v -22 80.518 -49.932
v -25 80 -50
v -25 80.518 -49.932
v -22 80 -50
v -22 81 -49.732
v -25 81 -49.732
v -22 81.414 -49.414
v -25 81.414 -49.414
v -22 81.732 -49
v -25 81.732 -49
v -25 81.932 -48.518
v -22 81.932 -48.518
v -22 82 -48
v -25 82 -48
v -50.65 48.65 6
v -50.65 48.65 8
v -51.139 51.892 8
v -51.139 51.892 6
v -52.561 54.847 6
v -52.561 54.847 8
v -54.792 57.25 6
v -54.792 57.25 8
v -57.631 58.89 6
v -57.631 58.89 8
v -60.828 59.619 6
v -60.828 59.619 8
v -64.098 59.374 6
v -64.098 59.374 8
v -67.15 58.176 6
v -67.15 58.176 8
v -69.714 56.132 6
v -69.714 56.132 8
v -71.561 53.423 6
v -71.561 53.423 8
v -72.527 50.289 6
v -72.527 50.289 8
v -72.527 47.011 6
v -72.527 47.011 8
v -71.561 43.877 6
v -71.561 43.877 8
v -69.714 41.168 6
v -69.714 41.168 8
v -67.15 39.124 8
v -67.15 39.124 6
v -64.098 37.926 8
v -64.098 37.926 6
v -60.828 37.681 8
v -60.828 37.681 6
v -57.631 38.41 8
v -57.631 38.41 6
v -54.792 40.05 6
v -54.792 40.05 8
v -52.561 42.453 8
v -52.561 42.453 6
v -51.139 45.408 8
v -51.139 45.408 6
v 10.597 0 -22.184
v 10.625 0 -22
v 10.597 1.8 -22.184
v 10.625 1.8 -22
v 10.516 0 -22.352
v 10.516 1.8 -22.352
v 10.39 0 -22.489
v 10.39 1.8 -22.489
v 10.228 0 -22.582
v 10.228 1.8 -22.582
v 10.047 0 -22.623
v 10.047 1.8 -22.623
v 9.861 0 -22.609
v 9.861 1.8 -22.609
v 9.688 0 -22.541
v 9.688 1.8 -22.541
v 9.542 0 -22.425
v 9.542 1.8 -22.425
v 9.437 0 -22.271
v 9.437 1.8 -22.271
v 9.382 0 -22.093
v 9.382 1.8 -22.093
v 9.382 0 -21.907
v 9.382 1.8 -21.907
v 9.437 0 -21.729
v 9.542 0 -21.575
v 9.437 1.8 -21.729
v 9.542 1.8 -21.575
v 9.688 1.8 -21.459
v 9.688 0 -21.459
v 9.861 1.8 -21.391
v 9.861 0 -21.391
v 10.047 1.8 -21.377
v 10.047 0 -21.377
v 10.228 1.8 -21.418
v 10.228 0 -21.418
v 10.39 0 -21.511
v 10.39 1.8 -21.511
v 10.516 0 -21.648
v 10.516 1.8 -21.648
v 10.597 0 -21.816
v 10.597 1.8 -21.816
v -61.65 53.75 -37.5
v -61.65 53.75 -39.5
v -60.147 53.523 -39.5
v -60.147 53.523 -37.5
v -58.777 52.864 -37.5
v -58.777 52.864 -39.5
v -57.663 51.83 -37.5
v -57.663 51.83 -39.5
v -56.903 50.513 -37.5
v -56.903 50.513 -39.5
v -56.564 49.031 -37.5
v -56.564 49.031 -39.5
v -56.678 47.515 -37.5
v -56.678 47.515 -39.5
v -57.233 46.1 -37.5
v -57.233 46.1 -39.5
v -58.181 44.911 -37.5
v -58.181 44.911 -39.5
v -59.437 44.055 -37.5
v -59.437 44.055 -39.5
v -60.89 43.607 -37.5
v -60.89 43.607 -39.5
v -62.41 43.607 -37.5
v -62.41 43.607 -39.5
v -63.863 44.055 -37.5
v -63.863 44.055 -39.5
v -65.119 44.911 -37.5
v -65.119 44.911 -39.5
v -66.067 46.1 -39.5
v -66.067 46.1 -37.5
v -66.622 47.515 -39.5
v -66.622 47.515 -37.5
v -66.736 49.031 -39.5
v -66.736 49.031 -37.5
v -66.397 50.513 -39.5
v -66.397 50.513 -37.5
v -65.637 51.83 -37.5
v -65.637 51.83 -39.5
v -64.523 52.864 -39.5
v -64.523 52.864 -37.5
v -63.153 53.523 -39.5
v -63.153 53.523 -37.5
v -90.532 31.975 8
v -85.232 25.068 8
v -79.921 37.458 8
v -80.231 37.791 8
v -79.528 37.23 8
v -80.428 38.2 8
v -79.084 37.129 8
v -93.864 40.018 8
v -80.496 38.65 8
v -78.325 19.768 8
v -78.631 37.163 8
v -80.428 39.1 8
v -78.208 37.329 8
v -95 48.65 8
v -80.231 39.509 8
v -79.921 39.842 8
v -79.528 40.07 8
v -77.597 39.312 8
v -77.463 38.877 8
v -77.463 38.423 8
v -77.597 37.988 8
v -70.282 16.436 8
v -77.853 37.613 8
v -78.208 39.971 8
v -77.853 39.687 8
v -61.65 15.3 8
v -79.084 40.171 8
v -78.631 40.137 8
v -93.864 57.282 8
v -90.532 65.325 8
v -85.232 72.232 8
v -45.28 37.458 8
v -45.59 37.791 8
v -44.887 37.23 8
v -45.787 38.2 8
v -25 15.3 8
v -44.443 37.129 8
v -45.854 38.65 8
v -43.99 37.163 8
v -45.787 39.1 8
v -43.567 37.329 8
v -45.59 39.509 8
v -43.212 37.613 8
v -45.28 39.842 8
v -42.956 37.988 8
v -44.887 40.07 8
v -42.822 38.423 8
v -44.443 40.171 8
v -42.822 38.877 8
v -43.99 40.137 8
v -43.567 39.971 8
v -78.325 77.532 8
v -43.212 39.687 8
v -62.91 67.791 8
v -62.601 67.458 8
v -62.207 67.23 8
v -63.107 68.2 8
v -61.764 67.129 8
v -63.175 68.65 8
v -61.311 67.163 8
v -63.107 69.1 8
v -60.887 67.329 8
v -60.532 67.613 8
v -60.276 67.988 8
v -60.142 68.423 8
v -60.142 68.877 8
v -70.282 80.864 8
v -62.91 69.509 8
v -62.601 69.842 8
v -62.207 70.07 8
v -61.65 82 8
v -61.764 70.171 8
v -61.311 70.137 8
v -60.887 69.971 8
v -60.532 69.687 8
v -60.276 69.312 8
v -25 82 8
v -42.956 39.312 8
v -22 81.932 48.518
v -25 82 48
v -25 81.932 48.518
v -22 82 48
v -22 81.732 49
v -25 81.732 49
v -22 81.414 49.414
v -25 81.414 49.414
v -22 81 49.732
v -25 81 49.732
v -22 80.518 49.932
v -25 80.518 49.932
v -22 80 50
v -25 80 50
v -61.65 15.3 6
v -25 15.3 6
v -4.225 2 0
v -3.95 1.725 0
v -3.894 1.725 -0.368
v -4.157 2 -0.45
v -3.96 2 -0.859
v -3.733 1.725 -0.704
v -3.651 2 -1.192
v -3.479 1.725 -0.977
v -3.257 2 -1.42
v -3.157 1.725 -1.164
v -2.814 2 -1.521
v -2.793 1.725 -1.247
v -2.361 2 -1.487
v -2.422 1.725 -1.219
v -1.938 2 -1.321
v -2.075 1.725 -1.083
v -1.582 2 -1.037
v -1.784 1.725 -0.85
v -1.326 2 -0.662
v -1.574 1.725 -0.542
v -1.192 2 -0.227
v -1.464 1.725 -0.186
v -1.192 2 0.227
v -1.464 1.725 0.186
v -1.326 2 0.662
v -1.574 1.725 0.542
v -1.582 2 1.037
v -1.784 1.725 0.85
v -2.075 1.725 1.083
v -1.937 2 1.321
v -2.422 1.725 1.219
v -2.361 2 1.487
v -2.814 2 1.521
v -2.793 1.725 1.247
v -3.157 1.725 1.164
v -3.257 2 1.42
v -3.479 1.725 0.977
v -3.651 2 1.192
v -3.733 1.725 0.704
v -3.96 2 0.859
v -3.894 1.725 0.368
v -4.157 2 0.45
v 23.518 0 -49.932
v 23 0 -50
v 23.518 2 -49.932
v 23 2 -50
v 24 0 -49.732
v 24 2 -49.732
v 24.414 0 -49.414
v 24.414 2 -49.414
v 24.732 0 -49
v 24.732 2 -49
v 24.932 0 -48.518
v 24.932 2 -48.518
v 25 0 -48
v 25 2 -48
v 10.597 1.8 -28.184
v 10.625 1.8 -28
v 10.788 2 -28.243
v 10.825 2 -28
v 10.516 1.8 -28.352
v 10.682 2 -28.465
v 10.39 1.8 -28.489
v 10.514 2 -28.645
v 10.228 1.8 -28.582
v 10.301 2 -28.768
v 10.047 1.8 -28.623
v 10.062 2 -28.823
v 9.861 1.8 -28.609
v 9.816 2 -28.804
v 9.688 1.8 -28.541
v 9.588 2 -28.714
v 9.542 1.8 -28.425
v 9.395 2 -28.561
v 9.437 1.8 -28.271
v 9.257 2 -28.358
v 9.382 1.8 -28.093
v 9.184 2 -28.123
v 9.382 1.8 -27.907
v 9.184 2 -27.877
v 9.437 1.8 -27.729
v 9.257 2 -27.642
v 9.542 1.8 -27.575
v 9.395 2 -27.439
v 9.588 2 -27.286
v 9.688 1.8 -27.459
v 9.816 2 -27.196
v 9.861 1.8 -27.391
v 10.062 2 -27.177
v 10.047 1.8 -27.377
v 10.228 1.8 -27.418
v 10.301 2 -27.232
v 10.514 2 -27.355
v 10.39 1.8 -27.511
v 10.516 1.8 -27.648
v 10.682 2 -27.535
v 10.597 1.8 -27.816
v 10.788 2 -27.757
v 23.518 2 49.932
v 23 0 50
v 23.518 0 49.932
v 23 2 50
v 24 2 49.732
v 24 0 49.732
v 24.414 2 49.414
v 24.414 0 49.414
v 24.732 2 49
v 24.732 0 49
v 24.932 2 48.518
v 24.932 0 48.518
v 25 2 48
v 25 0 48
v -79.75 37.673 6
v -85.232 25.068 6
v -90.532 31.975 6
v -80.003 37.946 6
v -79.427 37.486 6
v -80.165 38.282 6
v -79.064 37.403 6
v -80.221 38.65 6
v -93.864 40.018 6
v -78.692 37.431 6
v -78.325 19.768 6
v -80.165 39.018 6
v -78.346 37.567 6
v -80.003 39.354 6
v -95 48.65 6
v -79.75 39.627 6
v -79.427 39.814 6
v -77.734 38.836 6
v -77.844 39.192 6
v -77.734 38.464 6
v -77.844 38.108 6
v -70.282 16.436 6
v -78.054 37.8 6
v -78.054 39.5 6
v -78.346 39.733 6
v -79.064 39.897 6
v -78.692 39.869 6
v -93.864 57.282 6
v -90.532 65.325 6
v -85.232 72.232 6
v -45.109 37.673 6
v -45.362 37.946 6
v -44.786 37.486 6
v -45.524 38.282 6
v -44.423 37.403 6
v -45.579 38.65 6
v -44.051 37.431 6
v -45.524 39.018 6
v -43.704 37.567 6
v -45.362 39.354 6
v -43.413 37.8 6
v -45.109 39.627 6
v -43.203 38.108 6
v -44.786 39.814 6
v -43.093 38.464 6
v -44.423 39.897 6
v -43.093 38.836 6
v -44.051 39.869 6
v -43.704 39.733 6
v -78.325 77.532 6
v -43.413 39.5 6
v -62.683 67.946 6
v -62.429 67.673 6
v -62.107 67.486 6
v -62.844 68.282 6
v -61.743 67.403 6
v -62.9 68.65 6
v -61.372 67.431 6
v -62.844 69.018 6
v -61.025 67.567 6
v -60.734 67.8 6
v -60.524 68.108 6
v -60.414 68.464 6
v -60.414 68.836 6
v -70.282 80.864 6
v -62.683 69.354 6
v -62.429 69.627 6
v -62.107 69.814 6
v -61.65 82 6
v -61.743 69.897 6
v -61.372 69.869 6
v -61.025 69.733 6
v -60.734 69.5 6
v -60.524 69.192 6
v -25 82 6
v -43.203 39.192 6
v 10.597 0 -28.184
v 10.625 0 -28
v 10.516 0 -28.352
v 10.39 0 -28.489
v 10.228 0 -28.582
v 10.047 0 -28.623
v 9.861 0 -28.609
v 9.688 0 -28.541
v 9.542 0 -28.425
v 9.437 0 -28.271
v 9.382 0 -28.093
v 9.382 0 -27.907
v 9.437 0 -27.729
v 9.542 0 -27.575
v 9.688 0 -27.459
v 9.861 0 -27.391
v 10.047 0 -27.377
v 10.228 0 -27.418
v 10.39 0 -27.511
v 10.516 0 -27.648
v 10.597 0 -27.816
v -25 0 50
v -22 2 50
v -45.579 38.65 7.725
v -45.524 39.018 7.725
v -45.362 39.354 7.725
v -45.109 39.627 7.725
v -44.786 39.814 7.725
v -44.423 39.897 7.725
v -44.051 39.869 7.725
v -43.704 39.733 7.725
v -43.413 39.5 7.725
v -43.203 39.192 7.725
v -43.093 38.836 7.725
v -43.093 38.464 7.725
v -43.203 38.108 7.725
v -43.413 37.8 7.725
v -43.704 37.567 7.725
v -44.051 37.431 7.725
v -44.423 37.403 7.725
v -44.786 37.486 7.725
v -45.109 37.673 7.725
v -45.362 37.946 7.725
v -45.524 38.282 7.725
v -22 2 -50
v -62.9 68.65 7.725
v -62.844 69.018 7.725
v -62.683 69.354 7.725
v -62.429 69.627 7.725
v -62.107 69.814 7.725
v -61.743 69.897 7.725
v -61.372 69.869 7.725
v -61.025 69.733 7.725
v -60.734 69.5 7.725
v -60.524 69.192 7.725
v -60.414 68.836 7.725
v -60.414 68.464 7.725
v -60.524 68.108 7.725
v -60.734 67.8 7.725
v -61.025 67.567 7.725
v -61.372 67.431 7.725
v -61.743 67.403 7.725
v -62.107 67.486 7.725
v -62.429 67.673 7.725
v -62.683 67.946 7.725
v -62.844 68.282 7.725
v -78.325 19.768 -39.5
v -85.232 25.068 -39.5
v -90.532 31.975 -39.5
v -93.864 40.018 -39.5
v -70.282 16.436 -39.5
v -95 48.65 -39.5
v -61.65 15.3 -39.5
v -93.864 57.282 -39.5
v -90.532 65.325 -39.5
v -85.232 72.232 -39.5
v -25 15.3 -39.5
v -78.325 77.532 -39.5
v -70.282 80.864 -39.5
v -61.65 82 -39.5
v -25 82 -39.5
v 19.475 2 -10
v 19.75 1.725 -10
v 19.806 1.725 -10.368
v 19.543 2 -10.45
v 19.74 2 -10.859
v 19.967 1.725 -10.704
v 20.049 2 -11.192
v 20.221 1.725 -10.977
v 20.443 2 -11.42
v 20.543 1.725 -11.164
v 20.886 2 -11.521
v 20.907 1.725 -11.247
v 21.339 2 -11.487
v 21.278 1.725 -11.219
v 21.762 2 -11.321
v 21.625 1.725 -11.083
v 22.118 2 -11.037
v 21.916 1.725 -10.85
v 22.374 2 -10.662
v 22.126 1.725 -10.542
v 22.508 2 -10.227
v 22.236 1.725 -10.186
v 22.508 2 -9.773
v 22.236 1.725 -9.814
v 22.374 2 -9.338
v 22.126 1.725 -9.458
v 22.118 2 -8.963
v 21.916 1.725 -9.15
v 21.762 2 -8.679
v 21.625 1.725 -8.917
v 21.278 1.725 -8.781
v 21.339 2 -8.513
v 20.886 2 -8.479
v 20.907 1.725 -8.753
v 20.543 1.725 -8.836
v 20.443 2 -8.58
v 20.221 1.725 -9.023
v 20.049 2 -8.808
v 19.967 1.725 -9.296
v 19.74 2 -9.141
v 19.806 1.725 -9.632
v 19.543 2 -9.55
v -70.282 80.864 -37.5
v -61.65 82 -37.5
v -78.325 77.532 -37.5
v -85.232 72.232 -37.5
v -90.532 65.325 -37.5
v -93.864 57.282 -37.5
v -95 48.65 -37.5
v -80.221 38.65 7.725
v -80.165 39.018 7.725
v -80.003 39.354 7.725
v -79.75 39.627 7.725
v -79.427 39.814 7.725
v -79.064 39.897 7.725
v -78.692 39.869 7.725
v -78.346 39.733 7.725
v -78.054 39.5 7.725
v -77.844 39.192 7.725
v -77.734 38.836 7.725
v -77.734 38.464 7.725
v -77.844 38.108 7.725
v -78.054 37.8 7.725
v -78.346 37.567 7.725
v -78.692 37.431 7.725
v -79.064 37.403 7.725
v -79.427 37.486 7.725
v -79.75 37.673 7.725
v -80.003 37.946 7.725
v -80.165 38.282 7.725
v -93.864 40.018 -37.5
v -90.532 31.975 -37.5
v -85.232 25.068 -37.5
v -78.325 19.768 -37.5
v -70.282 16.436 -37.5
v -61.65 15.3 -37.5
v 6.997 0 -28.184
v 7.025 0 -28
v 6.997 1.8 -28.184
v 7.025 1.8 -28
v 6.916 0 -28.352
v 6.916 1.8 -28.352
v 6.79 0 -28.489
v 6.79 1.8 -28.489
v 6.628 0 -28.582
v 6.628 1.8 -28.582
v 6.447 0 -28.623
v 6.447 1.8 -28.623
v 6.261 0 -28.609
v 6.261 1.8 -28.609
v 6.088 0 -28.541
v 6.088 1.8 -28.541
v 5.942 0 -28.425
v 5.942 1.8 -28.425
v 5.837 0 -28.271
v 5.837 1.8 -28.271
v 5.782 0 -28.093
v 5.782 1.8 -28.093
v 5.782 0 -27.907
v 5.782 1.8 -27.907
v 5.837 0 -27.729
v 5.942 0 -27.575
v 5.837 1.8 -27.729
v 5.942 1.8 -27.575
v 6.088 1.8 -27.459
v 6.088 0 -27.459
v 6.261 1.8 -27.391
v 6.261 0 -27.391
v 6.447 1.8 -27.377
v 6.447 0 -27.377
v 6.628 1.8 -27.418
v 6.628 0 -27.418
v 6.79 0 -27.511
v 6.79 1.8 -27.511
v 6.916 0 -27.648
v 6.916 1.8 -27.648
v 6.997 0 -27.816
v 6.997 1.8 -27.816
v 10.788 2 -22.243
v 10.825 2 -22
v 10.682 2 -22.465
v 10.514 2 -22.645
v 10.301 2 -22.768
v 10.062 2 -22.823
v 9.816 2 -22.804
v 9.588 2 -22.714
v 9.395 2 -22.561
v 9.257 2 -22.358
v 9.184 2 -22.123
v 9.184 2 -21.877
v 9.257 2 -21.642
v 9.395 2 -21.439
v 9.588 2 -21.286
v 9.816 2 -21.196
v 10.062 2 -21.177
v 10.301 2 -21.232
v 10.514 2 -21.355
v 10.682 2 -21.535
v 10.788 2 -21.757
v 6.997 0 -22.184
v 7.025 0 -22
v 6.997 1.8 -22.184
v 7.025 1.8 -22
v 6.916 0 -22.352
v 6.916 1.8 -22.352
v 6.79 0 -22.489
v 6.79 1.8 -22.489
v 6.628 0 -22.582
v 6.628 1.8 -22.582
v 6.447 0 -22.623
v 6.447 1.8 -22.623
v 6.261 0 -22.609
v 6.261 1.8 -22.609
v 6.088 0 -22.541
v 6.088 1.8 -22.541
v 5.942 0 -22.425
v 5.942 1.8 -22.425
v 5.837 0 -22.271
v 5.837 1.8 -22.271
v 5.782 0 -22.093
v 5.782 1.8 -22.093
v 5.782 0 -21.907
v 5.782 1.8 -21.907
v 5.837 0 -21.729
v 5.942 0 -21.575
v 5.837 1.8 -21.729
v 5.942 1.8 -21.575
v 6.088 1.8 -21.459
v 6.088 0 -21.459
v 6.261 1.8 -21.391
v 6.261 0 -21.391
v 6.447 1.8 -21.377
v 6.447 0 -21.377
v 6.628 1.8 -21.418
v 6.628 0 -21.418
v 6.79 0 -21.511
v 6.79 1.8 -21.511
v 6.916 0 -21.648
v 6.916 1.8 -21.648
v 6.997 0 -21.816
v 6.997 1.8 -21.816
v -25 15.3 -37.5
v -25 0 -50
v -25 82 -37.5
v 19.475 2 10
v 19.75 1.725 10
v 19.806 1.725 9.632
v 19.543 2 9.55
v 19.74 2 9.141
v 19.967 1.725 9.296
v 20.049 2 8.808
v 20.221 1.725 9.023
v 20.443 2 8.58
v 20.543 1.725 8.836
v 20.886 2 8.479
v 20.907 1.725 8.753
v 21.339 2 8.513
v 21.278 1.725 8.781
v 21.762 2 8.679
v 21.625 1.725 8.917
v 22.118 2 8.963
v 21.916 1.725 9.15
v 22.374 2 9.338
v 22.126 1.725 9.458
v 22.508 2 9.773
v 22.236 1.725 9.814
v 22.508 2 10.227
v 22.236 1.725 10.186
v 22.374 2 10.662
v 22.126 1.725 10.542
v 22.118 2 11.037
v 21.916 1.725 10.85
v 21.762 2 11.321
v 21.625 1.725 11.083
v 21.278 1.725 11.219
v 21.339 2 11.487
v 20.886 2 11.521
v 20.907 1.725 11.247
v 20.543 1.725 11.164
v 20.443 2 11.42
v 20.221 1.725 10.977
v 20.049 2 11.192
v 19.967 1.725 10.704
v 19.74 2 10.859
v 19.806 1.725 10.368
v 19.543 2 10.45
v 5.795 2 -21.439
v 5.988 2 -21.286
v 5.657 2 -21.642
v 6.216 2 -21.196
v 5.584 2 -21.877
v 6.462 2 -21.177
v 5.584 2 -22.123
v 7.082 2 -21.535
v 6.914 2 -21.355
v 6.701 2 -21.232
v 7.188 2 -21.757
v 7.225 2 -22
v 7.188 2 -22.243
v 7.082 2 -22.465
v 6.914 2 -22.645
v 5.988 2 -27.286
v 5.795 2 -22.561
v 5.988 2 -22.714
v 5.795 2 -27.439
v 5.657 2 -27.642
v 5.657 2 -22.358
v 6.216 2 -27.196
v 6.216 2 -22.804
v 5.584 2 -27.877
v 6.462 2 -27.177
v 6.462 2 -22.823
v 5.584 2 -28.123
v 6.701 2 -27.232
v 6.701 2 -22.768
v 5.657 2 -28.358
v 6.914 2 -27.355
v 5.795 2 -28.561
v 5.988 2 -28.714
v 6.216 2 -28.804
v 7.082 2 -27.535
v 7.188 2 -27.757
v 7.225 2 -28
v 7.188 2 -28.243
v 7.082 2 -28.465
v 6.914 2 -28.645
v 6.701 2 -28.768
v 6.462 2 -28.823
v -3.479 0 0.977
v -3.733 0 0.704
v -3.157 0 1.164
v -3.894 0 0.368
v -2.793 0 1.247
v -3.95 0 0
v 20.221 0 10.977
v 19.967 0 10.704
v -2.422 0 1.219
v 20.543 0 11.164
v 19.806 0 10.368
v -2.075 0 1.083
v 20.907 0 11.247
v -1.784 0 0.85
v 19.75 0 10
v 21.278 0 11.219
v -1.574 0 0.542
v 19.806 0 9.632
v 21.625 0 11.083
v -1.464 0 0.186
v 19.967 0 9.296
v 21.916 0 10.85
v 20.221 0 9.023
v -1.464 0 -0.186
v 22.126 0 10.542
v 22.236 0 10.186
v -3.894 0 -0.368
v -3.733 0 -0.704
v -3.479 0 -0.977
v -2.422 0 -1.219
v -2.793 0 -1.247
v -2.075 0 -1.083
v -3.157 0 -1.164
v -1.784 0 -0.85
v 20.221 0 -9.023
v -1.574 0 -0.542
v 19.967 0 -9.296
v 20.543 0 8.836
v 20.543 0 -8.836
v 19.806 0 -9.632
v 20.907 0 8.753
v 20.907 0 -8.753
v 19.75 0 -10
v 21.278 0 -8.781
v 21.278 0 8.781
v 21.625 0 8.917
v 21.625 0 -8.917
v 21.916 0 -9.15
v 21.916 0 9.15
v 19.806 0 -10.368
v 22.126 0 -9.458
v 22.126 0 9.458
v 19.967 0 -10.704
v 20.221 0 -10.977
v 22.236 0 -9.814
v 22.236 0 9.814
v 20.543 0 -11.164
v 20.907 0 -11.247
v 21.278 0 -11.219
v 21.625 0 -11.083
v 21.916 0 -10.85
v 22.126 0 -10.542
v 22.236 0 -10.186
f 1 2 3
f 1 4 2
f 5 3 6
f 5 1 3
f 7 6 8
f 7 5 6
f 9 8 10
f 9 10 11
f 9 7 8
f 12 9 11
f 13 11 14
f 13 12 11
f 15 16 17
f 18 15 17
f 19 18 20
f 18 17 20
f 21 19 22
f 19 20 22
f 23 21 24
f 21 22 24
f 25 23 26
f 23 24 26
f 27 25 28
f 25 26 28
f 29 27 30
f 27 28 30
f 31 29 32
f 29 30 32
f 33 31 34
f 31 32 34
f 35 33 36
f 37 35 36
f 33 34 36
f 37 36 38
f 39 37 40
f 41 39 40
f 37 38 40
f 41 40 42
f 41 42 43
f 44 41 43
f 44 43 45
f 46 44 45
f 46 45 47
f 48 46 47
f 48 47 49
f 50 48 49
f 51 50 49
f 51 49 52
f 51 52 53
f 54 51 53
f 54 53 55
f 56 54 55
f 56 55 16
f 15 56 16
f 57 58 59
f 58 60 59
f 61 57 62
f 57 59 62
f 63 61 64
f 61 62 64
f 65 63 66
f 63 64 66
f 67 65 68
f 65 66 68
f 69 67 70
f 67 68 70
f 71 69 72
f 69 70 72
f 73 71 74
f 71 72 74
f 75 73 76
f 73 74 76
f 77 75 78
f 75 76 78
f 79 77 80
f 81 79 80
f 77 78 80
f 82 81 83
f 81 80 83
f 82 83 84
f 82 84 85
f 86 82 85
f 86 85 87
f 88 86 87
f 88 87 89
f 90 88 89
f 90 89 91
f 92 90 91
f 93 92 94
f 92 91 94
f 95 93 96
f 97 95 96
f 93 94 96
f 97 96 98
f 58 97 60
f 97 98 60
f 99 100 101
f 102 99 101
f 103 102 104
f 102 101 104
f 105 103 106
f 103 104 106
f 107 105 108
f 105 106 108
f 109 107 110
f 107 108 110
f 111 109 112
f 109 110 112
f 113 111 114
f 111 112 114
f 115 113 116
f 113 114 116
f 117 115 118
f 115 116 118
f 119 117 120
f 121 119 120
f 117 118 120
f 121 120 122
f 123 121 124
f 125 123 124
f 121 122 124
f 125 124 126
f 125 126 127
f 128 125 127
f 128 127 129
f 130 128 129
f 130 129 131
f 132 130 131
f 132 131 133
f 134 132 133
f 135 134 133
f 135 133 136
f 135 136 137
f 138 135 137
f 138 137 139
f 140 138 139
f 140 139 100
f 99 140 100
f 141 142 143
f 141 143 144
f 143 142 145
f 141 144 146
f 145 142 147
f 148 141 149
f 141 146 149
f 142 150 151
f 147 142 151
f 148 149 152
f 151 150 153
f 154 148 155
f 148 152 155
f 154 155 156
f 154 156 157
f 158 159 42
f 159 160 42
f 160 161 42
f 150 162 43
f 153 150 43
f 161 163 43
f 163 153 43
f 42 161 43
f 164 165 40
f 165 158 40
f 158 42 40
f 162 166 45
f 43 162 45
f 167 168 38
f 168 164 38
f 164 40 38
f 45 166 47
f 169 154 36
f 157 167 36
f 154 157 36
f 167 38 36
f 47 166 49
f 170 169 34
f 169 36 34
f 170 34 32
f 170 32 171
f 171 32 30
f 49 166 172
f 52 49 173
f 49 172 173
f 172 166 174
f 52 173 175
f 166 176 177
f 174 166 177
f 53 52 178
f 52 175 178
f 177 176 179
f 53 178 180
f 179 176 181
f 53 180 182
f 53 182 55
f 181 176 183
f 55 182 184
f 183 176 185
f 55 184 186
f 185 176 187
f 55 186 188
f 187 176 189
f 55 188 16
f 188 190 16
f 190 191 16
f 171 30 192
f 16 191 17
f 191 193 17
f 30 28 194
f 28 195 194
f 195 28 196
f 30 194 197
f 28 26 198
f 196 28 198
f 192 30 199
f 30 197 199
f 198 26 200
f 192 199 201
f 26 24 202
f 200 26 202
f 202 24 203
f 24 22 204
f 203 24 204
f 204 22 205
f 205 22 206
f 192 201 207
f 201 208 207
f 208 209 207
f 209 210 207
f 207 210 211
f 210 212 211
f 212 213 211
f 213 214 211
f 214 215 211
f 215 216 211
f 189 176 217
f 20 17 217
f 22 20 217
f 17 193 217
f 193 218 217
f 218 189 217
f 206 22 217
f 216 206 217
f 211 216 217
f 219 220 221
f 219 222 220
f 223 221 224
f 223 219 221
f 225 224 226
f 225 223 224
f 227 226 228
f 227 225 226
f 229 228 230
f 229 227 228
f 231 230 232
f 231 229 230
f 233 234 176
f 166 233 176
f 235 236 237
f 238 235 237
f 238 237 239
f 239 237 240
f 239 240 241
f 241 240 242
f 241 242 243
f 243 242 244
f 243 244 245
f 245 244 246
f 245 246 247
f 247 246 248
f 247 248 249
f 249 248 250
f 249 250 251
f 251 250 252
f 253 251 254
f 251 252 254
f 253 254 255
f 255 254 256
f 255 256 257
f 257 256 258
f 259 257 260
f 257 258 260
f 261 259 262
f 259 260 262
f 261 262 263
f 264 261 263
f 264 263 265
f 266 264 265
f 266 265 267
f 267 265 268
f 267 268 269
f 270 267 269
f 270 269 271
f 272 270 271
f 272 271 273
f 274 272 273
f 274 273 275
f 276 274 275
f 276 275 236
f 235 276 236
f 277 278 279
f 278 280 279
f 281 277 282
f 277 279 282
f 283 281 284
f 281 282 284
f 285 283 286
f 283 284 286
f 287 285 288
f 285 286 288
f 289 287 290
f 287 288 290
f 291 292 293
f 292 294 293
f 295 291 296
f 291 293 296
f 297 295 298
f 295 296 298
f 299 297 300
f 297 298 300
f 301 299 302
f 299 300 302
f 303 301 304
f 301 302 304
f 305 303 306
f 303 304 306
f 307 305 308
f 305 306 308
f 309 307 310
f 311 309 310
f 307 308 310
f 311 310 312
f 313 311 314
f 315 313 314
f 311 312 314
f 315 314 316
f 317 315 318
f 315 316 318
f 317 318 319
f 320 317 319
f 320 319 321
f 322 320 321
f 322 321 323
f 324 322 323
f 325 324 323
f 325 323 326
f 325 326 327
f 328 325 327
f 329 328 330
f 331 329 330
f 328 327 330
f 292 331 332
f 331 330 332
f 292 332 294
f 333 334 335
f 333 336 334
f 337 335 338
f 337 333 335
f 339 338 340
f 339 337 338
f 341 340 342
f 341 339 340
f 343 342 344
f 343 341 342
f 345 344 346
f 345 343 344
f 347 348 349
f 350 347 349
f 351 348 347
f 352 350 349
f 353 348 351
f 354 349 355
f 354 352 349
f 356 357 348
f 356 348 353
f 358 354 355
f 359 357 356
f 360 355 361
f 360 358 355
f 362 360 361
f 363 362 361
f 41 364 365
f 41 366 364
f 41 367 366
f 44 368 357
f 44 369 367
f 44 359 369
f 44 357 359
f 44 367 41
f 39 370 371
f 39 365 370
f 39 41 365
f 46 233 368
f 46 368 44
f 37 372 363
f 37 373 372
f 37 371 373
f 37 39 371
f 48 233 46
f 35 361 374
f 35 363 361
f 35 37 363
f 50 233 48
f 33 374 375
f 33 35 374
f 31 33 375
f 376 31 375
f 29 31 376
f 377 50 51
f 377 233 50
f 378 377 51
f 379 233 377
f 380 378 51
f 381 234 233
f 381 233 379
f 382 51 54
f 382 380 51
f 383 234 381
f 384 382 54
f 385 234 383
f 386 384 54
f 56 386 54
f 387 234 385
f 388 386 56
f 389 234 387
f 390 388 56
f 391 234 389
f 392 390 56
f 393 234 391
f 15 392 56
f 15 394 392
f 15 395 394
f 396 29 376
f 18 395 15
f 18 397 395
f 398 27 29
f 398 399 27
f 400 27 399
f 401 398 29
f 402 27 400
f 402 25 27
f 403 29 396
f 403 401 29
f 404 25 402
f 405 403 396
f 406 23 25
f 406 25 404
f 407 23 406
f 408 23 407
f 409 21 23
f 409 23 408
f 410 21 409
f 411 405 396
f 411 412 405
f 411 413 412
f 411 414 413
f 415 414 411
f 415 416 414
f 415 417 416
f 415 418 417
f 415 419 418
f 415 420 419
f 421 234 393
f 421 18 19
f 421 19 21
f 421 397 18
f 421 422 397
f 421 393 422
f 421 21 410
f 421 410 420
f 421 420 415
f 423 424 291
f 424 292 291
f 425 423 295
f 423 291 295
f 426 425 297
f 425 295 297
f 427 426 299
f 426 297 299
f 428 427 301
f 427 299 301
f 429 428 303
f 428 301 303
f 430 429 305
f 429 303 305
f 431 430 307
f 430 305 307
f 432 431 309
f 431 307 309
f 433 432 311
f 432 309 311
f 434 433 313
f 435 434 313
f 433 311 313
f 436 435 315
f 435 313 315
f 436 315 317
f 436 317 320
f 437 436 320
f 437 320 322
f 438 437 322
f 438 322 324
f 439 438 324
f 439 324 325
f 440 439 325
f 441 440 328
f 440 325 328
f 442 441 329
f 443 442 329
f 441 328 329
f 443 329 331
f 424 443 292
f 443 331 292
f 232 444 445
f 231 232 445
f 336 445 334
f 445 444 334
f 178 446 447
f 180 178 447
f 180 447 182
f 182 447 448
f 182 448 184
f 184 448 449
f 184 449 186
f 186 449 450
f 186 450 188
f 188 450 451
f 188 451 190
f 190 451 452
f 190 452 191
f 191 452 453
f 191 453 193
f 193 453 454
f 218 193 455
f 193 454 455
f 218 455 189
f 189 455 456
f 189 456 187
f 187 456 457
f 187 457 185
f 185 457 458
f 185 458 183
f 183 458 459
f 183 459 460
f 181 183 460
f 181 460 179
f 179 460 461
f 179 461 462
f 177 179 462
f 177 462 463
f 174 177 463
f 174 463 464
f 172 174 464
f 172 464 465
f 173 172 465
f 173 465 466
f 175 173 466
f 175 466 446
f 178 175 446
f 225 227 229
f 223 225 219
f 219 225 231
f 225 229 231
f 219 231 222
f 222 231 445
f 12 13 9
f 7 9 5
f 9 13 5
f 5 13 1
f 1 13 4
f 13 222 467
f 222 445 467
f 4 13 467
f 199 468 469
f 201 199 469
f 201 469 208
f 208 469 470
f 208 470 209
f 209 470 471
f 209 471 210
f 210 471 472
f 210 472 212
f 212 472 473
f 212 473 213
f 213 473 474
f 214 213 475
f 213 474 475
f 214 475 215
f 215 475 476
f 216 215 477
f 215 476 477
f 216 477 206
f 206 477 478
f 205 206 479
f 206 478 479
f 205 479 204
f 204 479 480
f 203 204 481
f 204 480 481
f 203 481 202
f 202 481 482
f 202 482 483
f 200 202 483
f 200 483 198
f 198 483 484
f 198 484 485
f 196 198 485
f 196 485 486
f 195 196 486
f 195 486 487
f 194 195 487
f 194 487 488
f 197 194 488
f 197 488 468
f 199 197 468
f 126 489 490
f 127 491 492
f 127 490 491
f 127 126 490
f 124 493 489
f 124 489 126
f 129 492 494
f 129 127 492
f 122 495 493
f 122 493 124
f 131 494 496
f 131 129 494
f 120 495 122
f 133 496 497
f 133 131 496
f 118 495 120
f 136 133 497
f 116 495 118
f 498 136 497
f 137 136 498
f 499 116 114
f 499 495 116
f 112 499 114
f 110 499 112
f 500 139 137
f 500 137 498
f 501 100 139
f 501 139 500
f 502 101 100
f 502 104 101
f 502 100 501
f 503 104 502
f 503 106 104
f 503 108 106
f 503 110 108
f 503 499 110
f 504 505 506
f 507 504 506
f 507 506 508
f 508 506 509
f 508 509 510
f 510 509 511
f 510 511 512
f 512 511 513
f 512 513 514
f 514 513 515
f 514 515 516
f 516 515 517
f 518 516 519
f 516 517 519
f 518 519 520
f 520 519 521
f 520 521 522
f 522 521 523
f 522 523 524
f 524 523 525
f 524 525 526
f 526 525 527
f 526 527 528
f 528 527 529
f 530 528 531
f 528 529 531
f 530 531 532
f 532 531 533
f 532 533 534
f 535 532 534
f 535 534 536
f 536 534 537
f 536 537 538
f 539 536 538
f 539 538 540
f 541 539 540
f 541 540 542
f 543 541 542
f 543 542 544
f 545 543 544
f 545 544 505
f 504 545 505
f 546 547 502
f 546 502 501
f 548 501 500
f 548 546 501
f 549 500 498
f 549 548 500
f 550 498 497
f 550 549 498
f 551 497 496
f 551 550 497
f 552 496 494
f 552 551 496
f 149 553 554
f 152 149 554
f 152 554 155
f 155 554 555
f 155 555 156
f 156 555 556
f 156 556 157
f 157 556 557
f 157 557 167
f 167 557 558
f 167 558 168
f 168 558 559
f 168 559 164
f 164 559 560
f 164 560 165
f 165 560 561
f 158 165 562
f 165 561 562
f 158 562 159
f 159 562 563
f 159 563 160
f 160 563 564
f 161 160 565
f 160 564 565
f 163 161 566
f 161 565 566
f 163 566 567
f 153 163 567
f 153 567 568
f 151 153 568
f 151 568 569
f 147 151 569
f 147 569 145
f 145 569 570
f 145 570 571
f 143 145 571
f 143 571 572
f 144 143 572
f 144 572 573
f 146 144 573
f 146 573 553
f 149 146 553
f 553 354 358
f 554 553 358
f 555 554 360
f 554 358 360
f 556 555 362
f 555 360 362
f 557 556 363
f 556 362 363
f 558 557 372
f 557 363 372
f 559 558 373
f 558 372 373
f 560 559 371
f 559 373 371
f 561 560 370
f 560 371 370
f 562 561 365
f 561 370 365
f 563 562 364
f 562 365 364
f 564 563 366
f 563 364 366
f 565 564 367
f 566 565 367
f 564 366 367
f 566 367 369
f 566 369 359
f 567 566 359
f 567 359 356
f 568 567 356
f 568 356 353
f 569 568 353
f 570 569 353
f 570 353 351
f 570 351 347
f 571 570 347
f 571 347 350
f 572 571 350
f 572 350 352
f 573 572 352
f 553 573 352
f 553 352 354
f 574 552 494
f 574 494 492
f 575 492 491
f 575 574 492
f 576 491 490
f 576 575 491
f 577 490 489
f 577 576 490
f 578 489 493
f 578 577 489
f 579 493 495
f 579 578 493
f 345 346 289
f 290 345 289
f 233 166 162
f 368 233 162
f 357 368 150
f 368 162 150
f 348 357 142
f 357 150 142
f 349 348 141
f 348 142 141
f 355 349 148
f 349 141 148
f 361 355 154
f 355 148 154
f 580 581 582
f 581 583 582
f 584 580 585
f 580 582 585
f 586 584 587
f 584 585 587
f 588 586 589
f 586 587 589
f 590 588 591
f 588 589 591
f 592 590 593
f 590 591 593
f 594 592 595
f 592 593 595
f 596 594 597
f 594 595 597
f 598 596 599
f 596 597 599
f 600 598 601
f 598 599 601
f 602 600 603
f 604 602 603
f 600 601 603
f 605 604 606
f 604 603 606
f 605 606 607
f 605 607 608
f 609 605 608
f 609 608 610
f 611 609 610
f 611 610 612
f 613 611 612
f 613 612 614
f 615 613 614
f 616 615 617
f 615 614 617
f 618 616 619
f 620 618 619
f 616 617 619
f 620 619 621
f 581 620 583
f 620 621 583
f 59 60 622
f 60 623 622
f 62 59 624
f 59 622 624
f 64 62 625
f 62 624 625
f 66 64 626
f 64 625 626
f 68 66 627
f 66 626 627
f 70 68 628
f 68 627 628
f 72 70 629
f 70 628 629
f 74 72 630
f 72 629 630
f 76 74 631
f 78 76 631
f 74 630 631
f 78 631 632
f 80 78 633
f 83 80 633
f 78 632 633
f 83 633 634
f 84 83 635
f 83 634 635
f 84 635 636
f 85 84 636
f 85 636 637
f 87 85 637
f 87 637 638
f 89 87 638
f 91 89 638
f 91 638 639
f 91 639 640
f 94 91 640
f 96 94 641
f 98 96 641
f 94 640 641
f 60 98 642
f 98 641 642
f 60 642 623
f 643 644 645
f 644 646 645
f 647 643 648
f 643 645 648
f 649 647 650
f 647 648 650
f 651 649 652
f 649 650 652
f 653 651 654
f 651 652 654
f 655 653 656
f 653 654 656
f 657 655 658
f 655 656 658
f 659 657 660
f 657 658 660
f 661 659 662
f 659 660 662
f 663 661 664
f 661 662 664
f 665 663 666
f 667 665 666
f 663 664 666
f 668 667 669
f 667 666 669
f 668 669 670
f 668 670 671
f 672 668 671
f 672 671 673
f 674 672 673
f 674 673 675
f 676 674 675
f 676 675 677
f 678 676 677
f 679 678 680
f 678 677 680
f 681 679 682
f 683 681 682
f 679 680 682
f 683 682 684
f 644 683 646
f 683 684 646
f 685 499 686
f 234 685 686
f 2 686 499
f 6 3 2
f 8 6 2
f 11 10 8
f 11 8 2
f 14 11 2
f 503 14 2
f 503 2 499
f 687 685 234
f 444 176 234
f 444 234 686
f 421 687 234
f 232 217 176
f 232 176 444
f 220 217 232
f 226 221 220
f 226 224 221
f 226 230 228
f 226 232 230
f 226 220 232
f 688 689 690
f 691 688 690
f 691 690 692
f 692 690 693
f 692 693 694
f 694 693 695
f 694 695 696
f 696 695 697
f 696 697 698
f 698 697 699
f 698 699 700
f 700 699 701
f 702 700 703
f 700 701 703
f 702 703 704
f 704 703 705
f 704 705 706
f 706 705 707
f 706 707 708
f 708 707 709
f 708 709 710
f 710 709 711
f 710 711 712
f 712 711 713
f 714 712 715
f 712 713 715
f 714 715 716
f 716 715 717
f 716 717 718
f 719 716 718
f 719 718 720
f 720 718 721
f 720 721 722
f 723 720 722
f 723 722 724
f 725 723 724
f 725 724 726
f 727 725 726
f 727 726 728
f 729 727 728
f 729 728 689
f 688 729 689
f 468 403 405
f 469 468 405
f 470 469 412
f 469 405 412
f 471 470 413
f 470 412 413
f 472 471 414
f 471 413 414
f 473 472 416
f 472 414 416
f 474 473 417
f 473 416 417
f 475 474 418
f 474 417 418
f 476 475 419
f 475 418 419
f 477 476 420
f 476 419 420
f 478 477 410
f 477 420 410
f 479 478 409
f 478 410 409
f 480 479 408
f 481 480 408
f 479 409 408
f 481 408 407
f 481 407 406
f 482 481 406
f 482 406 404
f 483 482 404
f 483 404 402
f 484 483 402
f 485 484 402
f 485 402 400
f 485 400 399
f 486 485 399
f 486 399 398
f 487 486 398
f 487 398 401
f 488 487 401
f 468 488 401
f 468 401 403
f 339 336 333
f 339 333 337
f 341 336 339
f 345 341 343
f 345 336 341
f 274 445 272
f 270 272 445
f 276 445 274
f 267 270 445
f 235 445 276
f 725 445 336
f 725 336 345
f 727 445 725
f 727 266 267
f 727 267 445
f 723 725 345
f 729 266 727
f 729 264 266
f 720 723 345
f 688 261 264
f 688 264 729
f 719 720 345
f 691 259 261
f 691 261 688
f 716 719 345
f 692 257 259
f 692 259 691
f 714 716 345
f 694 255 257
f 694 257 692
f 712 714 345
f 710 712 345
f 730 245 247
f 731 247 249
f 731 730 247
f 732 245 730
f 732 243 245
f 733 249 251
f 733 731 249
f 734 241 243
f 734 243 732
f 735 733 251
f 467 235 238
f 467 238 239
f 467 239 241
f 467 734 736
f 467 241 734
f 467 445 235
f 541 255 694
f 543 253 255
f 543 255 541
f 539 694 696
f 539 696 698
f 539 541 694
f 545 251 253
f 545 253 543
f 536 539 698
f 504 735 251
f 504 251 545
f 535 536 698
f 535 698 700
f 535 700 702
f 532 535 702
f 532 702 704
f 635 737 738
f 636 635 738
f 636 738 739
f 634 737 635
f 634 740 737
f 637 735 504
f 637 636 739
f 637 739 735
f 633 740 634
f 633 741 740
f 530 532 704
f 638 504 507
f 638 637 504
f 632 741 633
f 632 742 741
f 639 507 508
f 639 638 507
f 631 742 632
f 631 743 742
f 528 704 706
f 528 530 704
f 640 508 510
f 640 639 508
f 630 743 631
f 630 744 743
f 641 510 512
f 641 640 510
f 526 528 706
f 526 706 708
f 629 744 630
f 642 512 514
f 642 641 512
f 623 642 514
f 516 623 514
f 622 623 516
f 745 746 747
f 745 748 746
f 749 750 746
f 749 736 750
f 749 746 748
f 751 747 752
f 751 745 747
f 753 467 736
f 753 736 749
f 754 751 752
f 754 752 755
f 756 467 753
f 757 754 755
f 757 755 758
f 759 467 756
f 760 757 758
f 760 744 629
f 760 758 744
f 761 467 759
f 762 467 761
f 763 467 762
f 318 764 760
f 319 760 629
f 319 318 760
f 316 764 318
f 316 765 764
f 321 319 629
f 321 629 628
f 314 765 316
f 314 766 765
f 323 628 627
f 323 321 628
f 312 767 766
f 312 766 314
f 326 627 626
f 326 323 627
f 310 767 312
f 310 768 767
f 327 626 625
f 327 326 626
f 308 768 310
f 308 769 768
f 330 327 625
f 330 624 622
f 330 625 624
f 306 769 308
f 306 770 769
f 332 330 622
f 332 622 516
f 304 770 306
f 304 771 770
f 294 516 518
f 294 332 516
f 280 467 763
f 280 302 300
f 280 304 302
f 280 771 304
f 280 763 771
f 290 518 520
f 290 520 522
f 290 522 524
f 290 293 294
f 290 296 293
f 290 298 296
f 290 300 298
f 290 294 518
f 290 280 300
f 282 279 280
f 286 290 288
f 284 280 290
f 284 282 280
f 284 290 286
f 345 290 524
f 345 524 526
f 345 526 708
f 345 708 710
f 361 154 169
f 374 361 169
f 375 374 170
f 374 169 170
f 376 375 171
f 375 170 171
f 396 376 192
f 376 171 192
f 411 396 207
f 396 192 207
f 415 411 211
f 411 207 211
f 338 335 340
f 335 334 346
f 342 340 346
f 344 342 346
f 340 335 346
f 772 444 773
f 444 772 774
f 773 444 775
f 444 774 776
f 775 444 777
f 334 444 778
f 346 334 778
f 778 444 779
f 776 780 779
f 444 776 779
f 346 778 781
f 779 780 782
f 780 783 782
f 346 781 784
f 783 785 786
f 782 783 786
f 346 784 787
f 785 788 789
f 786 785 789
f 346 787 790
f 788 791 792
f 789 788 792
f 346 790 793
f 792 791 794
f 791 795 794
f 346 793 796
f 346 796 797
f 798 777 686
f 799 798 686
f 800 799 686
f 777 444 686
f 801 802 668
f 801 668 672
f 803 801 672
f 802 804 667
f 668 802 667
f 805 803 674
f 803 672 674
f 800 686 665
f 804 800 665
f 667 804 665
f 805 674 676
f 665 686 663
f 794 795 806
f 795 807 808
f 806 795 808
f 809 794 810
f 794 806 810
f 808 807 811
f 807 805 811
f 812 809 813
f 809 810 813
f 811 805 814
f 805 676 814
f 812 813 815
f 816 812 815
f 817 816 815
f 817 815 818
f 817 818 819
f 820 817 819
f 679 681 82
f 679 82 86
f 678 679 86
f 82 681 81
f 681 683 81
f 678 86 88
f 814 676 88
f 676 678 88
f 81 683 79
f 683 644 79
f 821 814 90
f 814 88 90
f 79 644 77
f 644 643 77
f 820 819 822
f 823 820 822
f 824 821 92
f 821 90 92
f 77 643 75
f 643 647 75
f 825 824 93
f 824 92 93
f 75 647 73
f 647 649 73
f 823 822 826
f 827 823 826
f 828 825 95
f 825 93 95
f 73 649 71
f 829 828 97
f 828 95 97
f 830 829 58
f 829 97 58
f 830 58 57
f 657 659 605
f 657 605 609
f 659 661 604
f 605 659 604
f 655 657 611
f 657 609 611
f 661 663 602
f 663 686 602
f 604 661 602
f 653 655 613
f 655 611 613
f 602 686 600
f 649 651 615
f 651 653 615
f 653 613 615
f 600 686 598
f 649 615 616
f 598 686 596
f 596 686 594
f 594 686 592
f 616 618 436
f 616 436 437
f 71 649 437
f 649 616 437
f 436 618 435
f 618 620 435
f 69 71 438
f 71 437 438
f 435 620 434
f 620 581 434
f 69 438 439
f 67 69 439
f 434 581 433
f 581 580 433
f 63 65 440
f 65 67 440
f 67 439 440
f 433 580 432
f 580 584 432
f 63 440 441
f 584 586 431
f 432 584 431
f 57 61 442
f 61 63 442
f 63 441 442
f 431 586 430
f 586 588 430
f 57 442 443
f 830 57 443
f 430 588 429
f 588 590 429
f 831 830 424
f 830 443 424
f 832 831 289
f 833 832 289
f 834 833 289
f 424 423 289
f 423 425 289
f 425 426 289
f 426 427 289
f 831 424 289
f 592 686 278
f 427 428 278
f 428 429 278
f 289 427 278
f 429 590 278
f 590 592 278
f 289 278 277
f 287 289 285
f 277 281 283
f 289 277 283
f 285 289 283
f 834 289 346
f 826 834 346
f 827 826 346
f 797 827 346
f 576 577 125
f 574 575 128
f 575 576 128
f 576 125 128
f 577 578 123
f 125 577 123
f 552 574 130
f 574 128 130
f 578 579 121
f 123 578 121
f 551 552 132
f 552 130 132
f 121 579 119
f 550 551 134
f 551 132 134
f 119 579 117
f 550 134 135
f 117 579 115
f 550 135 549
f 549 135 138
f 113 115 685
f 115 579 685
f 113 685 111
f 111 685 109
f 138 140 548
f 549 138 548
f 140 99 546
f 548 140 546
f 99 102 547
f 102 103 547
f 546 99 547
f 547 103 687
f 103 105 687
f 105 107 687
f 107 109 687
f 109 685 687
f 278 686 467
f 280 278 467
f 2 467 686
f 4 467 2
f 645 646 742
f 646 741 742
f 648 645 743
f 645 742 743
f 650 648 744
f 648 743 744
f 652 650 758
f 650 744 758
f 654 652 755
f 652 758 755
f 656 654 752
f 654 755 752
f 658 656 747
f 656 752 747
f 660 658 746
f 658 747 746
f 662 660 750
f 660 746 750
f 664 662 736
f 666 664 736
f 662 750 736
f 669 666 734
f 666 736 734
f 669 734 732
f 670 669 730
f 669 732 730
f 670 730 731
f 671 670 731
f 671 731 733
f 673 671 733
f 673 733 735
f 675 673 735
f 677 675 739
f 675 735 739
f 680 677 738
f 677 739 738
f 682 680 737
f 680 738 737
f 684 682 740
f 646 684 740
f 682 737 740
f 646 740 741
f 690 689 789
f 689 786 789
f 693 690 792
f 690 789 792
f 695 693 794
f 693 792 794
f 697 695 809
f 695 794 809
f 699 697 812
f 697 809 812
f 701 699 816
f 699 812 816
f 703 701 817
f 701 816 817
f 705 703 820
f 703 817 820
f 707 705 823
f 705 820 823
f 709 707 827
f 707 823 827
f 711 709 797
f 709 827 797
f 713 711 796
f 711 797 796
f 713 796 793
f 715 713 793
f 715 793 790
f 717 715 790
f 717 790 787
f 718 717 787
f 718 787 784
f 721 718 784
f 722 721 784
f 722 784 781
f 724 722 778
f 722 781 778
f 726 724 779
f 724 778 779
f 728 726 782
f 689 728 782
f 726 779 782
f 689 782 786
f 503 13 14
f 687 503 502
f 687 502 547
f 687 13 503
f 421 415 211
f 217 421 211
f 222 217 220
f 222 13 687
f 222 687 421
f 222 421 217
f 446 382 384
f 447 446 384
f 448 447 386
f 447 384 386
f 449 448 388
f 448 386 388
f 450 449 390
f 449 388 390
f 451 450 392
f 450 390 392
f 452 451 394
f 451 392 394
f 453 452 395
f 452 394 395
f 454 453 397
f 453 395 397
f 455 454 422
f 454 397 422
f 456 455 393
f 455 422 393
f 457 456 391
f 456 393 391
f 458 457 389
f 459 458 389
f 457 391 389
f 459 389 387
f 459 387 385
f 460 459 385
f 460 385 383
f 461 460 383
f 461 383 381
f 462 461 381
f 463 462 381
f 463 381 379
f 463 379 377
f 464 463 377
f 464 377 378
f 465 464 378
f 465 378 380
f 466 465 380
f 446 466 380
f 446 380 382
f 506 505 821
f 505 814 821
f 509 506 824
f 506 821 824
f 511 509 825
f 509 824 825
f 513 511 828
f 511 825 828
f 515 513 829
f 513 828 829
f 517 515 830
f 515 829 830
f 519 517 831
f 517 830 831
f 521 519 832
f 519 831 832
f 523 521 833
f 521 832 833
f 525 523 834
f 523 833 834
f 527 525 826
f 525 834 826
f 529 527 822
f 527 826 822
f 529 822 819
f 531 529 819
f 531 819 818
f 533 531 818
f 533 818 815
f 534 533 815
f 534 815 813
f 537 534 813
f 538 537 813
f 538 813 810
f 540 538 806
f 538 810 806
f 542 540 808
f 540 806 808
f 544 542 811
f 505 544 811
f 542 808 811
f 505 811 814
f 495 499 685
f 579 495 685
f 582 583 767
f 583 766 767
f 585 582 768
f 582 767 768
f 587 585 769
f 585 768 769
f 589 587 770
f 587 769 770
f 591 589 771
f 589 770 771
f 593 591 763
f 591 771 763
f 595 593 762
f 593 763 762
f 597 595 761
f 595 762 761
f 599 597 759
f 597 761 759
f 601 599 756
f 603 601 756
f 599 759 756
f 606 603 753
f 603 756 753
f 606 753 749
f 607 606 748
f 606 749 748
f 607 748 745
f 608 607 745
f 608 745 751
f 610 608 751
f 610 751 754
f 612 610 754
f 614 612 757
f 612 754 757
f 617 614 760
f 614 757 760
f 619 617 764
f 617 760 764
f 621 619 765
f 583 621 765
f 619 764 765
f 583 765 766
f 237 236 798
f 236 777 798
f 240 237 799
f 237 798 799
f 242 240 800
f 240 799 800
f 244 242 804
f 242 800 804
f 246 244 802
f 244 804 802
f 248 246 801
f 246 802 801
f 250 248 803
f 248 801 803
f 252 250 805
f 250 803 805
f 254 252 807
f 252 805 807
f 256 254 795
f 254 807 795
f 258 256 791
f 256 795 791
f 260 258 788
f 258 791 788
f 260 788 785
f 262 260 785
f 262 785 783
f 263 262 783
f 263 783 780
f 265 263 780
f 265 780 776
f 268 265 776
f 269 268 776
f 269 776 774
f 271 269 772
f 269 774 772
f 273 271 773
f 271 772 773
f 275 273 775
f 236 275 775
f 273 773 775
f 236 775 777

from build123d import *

# Parameters (mm, degrees)
SKETCH_1_W                   = 50
SKETCH_1_H                   = 100
EXTRUDE_1_DEPTH              = 2
SKETCH_2_W                   = 3
SKETCH_2_H                   = 100
EXTRUDE_2_DEPTH              = 80
SKETCH_3_W                   = 2
SKETCH_3_H                   = 66.7
EXTRUDE_3_DEPTH              = 70
CUT_EXTRUDE_4_REACH          = 162.465
SKETCH_8_W                   = 2
SKETCH_8_H                   = 66.7
EXTRUDE_4_DEPTH              = 70
CUT_EXTRUDE_5_REACH          = 140.25
HOLE_WIZARD_M3_1_D           = 2.5
HOLE_WIZARD_M3_1_DEPTH       = 2
HOLE_WIZARD_M3_1_CSINK_D     = 3.05
HOLE_WIZARD_M3_1_CSINK_ANGLE = 90
FILLET_1_R                   = 2
CUT_EXTRUDE_6_REACH          = 140.25
SKETCH_12_R                  = 11
CUT_EXTRUDE_7_REACH          = 162.465
SKETCH_13_R                  = 14.5
SKETCH_14_W                  = 2
SKETCH_14_H                  = 66.7
EXTRUDE_5_DEPTH              = 70
CUT_EXTRUDE_8_REACH          = 156.14
SKETCH_15_R                  = 5.1
CUT_EXTRUDE_9_DEPTH          = 155.140358116
CUT_EXTRUDE_9_DEPTH_BACK     = 155.140358116
SKETCH_19_W                  = 2
SKETCH_19_H                  = 66.7
CUT_EXTRUDE_10_DEPTH         = 119.844436134
FILLET_2_R                   = 2
HOLE_WIZARD_M3_3_D           = 2.5
HOLE_WIZARD_M3_3_CSINK_D     = 3.05
HOLE_WIZARD_M3_3_CSINK_ANGLE = 90


# Read off the part's stored shape, not the designer's step: M1.6 螺纹孔1, M1.6 螺纹孔2
with BuildPart() as part:
    # 草图1 → 凸台-拉伸1 (new body)
    with BuildSketch(Plane(origin=(0, 0, 0), x_dir=(1, 0, 0), z_dir=(0, 1, 0))):
        Rectangle(SKETCH_1_W, SKETCH_1_H)
    extrude(amount=EXTRUDE_1_DEPTH)

    # 草图2 → 凸台-拉伸2 (add)
    with BuildSketch(Plane(origin=(0, 2, 0), x_dir=(1, 0, 0), z_dir=(0, 1, 0))):
        with Locations((-23.5, 0)):
            Rectangle(SKETCH_2_W, SKETCH_2_H)
    extrude(amount=EXTRUDE_2_DEPTH)

    # 草图3 → 凸台-拉伸3 (add)
    with BuildSketch(Plane.ZY.offset(25)):
        with Locations((-49, 48.65)):
            Rectangle(SKETCH_3_W, SKETCH_3_H)
    extrude(amount=EXTRUDE_3_DEPTH)

    # 草图4 → 切除-拉伸4 (cut, up to next)
    with BuildSketch(Plane(origin=(0, 0, -50), x_dir=(-1, 0, 0), z_dir=(0, 0, -1)), mode=Mode.PRIVATE) as cut_extrude_4_sk1:
        with BuildLine():
            Line((95, 82), (61.65, 82))
            ThreePointArc((61.65, 82), (85.232011153, 72.232011153), (95, 48.65))
            Line((95, 48.65), (95, 82))
        make_face()
    cut_extrude_4_tool1 = extrude(cut_extrude_4_sk1.sketch, amount=-CUT_EXTRUDE_4_REACH, mode=Mode.PRIVATE) & part.part
    # 草图4 → 切除-拉伸4 (cut, up to next)
    with BuildSketch(Plane(origin=(0, 0, -50), x_dir=(-1, 0, 0), z_dir=(0, 0, -1)), mode=Mode.PRIVATE) as cut_extrude_4_sk2:
        with BuildLine():
            ThreePointArc((95, 48.65), (85.232011153, 25.067988847), (61.65, 15.3))
            Line((61.65, 15.3), (95, 15.3))
            Line((95, 15.3), (95, 48.65))
        make_face()
    cut_extrude_4_tool2 = extrude(cut_extrude_4_sk2.sketch, amount=-CUT_EXTRUDE_4_REACH, mode=Mode.PRIVATE) & part.part
    add(cut_extrude_4_tool1.solids().sort_by_distance((-87.550679, 74.550679, -50))[0], mode=Mode.SUBTRACT)
    add(cut_extrude_4_tool2.solids().sort_by_distance((-87.550679, 22.749321, -50))[0], mode=Mode.SUBTRACT)

    # 草图8 → 凸台-拉伸4 (add)
    with BuildSketch(Plane.ZY.offset(25)):
        with Locations((7, 48.65)):
            Rectangle(SKETCH_8_W, SKETCH_8_H)
    extrude(amount=EXTRUDE_4_DEPTH)

    # 草图9 → 切除-拉伸5 (cut, up to next)
    with BuildSketch(Plane.XY.offset(8), mode=Mode.PRIVATE) as cut_extrude_5_sk1:
        with BuildLine():
            ThreePointArc((-95, 48.65), (-85.232011153, 72.232011153), (-61.65, 82))
            Line((-61.65, 82), (-95, 82))
            Line((-95, 82), (-95, 48.65))
        make_face()
    cut_extrude_5_tool1 = extrude(cut_extrude_5_sk1.sketch, amount=-CUT_EXTRUDE_5_REACH, mode=Mode.PRIVATE) & part.part
    # 草图9 → 切除-拉伸5 (cut, up to next)
    with BuildSketch(Plane.XY.offset(8), mode=Mode.PRIVATE) as cut_extrude_5_sk2:
        with BuildLine():
            ThreePointArc((-61.65, 15.3), (-85.232011153, 25.067988847), (-95, 48.65))
            Line((-95, 48.65), (-95, 15.3))
            Line((-95, 15.3), (-61.65, 15.3))
        make_face()
    cut_extrude_5_tool2 = extrude(cut_extrude_5_sk2.sketch, amount=-CUT_EXTRUDE_5_REACH, mode=Mode.PRIVATE) & part.part
    add(cut_extrude_5_tool1.solids().sort_by_distance((-87.550679, 74.550679, 8))[0], mode=Mode.SUBTRACT)
    add(cut_extrude_5_tool2.solids().sort_by_distance((-87.550679, 22.749321, 8))[0], mode=Mode.SUBTRACT)

    # M3 螺纹孔1
    with Locations(Plane.XY.offset(8)):
        with Locations((-78.970508076, 38.65), (-61.65, 68.65), (-44.329491924, 38.65)):
            CounterSinkHole(HOLE_WIZARD_M3_1_D / 2, HOLE_WIZARD_M3_1_CSINK_D / 2, depth=HOLE_WIZARD_M3_1_DEPTH, counter_sink_angle=HOLE_WIZARD_M3_1_CSINK_ANGLE)

    # 圆角1
    fillet_1_edges = [part.edges().sort_by_distance(p)[0] for p in [
        (-23.5, 82, 50),
        (25, 1, 50),
        (25, 1, -50),
    ]]
    fillet(fillet_1_edges, radius=FILLET_1_R)

    # 草图12 → 切除-拉伸6 (cut, up to next)
    with BuildSketch(Plane.XY.offset(8), mode=Mode.PRIVATE) as cut_extrude_6_sk1:
        with Locations((-61.65, 48.65)):
            Circle(SKETCH_12_R)
    cut_extrude_6_tool1 = extrude(cut_extrude_6_sk1.sketch, amount=-CUT_EXTRUDE_6_REACH, mode=Mode.PRIVATE) & part.part
    add(cut_extrude_6_tool1.solids().sort_by_distance((-61.65, 48.65, 8))[0], mode=Mode.SUBTRACT)

    # 草图13 → 切除-拉伸7 (cut, up to next)
    with BuildSketch(Plane(origin=(0, 0, -50), x_dir=(-1, 0, 0), z_dir=(0, 0, -1)), mode=Mode.PRIVATE) as cut_extrude_7_sk1:
        with Locations((61.65, 48.65)):
            Circle(SKETCH_13_R)
    cut_extrude_7_tool1 = extrude(cut_extrude_7_sk1.sketch, amount=-CUT_EXTRUDE_7_REACH, mode=Mode.PRIVATE) & part.part
    add(cut_extrude_7_tool1.solids().sort_by_distance((-61.65, 48.65, -50))[0], mode=Mode.SUBTRACT)

    # 草图14 → 凸台-拉伸5 (add)
    with BuildSketch(Plane.ZY.offset(25)):
        with Locations((-38.5, 48.65)):
            Rectangle(SKETCH_14_W, SKETCH_14_H)
    extrude(amount=EXTRUDE_5_DEPTH)

    # 草图15 → 切除-拉伸8 (cut, up to next)
    with BuildSketch(Plane(origin=(0, 0, -39.5), x_dir=(-1, 0, 0), z_dir=(0, 0, -1)), mode=Mode.PRIVATE) as cut_extrude_8_sk1:
        with Locations(Location((61.65, 48.65, 0), (0, 0, 90))):
            Circle(SKETCH_15_R)
    cut_extrude_8_tool1 = extrude(cut_extrude_8_sk1.sketch, amount=-CUT_EXTRUDE_8_REACH, mode=Mode.PRIVATE) & part.part
    add(cut_extrude_8_tool1.solids().sort_by_distance((-61.65, 48.65, -39.5))[0], mode=Mode.SUBTRACT)

    # 草图18 → 切除-拉伸9 (cut, two sides: drawn at the far end of the back side and taken through both)
    with BuildSketch(Plane(origin=(0, 0, -39.5), x_dir=(-1, 0, 0), z_dir=(0, 0, -1)).offset(-CUT_EXTRUDE_9_DEPTH_BACK)):
        with BuildLine():
            Line((95, 15.3), (95, 48.65))
            ThreePointArc((95, 48.65), (85.232011153, 25.067988847), (61.65, 15.3))
            Line((61.65, 15.3), (95, 15.3))
        make_face()
        with BuildLine():
            Line((95, 48.65), (95, 82))
            Line((95, 82), (61.65, 82))
            ThreePointArc((61.65, 82), (85.232011153, 72.232011153), (95, 48.65))
        make_face()
    extrude(amount=CUT_EXTRUDE_9_DEPTH + CUT_EXTRUDE_9_DEPTH_BACK, mode=Mode.SUBTRACT)

    # 草图19 → 切除-拉伸10 (cut, through all)
    with BuildSketch(Plane.ZY.offset(25)):
        with Locations((-49, 48.65)):
            Rectangle(SKETCH_19_W, SKETCH_19_H)
    extrude(amount=CUT_EXTRUDE_10_DEPTH, mode=Mode.SUBTRACT)

    # 圆角2
    fillet_2_edges = [part.edges().sort_by_distance(p)[0] for p in [
        (-23.5, 82, -50),
    ]]
    fillet(fillet_2_edges, radius=FILLET_2_R)

    # M3 螺纹孔3 (through all)
    with Locations(Plane(origin=(0, 2, 0), x_dir=(1, 0, 0), z_dir=(0, 1, 0))):
        with Locations((-2.7, 0), (21, 10), (21, -10)):
            CounterSinkHole(HOLE_WIZARD_M3_3_D / 2, HOLE_WIZARD_M3_3_CSINK_D / 2, counter_sink_angle=HOLE_WIZARD_M3_3_CSINK_ANGLE)

    # M1.6 螺纹孔1 outline → M1.6 螺纹孔1 (revolve, cut)
    with BuildSketch(Plane(origin=(10, 0, -28), x_dir=(1, 0, 0), z_dir=(0, 0, 1))):
        Polygon((0, 0), (0.625, 0), (0.625, 1.8), (0.825, 2), (0, 2), align=None)
    revolve(axis=Axis((10, 0, -28), (0, 1, 0)), mode=Mode.SUBTRACT)

    # Hole Wizard M1.6 _1 2 outline → Hole Wizard M1.6 _1 2 (revolve, cut)
    with BuildSketch(Plane(origin=(6.4, 0, -28), x_dir=(1, 0, 0), z_dir=(0, 0, 1))):
        Polygon((0, 0), (0.625, 0), (0.625, 1.8), (0.825, 2), (0, 2), align=None)
    revolve(axis=Axis((6.4, 0, -28), (0, 1, 0)), mode=Mode.SUBTRACT)

    # M1.6 螺纹孔2 outline → M1.6 螺纹孔2 (revolve, cut)
    with BuildSketch(Plane(origin=(10, 0, -22), x_dir=(1, 0, 0), z_dir=(0, 0, 1))):
        Polygon((0, 0), (0.625, 0), (0.625, 1.8), (0.825, 2), (0, 2), align=None)
    revolve(axis=Axis((10, 0, -22), (0, 1, 0)), mode=Mode.SUBTRACT)

    # Hole Wizard M1.6 _2 2 outline → Hole Wizard M1.6 _2 2 (revolve, cut)
    with BuildSketch(Plane(origin=(6.4, 0, -22), x_dir=(1, 0, 0), z_dir=(0, 0, 1))):
        Polygon((0, 0), (0.625, 0), (0.625, 1.8), (0.825, 2), (0, 2), align=None)
    revolve(axis=Axis((6.4, 0, -22), (0, 1, 0)), mode=Mode.SUBTRACT)


solid = part.part
